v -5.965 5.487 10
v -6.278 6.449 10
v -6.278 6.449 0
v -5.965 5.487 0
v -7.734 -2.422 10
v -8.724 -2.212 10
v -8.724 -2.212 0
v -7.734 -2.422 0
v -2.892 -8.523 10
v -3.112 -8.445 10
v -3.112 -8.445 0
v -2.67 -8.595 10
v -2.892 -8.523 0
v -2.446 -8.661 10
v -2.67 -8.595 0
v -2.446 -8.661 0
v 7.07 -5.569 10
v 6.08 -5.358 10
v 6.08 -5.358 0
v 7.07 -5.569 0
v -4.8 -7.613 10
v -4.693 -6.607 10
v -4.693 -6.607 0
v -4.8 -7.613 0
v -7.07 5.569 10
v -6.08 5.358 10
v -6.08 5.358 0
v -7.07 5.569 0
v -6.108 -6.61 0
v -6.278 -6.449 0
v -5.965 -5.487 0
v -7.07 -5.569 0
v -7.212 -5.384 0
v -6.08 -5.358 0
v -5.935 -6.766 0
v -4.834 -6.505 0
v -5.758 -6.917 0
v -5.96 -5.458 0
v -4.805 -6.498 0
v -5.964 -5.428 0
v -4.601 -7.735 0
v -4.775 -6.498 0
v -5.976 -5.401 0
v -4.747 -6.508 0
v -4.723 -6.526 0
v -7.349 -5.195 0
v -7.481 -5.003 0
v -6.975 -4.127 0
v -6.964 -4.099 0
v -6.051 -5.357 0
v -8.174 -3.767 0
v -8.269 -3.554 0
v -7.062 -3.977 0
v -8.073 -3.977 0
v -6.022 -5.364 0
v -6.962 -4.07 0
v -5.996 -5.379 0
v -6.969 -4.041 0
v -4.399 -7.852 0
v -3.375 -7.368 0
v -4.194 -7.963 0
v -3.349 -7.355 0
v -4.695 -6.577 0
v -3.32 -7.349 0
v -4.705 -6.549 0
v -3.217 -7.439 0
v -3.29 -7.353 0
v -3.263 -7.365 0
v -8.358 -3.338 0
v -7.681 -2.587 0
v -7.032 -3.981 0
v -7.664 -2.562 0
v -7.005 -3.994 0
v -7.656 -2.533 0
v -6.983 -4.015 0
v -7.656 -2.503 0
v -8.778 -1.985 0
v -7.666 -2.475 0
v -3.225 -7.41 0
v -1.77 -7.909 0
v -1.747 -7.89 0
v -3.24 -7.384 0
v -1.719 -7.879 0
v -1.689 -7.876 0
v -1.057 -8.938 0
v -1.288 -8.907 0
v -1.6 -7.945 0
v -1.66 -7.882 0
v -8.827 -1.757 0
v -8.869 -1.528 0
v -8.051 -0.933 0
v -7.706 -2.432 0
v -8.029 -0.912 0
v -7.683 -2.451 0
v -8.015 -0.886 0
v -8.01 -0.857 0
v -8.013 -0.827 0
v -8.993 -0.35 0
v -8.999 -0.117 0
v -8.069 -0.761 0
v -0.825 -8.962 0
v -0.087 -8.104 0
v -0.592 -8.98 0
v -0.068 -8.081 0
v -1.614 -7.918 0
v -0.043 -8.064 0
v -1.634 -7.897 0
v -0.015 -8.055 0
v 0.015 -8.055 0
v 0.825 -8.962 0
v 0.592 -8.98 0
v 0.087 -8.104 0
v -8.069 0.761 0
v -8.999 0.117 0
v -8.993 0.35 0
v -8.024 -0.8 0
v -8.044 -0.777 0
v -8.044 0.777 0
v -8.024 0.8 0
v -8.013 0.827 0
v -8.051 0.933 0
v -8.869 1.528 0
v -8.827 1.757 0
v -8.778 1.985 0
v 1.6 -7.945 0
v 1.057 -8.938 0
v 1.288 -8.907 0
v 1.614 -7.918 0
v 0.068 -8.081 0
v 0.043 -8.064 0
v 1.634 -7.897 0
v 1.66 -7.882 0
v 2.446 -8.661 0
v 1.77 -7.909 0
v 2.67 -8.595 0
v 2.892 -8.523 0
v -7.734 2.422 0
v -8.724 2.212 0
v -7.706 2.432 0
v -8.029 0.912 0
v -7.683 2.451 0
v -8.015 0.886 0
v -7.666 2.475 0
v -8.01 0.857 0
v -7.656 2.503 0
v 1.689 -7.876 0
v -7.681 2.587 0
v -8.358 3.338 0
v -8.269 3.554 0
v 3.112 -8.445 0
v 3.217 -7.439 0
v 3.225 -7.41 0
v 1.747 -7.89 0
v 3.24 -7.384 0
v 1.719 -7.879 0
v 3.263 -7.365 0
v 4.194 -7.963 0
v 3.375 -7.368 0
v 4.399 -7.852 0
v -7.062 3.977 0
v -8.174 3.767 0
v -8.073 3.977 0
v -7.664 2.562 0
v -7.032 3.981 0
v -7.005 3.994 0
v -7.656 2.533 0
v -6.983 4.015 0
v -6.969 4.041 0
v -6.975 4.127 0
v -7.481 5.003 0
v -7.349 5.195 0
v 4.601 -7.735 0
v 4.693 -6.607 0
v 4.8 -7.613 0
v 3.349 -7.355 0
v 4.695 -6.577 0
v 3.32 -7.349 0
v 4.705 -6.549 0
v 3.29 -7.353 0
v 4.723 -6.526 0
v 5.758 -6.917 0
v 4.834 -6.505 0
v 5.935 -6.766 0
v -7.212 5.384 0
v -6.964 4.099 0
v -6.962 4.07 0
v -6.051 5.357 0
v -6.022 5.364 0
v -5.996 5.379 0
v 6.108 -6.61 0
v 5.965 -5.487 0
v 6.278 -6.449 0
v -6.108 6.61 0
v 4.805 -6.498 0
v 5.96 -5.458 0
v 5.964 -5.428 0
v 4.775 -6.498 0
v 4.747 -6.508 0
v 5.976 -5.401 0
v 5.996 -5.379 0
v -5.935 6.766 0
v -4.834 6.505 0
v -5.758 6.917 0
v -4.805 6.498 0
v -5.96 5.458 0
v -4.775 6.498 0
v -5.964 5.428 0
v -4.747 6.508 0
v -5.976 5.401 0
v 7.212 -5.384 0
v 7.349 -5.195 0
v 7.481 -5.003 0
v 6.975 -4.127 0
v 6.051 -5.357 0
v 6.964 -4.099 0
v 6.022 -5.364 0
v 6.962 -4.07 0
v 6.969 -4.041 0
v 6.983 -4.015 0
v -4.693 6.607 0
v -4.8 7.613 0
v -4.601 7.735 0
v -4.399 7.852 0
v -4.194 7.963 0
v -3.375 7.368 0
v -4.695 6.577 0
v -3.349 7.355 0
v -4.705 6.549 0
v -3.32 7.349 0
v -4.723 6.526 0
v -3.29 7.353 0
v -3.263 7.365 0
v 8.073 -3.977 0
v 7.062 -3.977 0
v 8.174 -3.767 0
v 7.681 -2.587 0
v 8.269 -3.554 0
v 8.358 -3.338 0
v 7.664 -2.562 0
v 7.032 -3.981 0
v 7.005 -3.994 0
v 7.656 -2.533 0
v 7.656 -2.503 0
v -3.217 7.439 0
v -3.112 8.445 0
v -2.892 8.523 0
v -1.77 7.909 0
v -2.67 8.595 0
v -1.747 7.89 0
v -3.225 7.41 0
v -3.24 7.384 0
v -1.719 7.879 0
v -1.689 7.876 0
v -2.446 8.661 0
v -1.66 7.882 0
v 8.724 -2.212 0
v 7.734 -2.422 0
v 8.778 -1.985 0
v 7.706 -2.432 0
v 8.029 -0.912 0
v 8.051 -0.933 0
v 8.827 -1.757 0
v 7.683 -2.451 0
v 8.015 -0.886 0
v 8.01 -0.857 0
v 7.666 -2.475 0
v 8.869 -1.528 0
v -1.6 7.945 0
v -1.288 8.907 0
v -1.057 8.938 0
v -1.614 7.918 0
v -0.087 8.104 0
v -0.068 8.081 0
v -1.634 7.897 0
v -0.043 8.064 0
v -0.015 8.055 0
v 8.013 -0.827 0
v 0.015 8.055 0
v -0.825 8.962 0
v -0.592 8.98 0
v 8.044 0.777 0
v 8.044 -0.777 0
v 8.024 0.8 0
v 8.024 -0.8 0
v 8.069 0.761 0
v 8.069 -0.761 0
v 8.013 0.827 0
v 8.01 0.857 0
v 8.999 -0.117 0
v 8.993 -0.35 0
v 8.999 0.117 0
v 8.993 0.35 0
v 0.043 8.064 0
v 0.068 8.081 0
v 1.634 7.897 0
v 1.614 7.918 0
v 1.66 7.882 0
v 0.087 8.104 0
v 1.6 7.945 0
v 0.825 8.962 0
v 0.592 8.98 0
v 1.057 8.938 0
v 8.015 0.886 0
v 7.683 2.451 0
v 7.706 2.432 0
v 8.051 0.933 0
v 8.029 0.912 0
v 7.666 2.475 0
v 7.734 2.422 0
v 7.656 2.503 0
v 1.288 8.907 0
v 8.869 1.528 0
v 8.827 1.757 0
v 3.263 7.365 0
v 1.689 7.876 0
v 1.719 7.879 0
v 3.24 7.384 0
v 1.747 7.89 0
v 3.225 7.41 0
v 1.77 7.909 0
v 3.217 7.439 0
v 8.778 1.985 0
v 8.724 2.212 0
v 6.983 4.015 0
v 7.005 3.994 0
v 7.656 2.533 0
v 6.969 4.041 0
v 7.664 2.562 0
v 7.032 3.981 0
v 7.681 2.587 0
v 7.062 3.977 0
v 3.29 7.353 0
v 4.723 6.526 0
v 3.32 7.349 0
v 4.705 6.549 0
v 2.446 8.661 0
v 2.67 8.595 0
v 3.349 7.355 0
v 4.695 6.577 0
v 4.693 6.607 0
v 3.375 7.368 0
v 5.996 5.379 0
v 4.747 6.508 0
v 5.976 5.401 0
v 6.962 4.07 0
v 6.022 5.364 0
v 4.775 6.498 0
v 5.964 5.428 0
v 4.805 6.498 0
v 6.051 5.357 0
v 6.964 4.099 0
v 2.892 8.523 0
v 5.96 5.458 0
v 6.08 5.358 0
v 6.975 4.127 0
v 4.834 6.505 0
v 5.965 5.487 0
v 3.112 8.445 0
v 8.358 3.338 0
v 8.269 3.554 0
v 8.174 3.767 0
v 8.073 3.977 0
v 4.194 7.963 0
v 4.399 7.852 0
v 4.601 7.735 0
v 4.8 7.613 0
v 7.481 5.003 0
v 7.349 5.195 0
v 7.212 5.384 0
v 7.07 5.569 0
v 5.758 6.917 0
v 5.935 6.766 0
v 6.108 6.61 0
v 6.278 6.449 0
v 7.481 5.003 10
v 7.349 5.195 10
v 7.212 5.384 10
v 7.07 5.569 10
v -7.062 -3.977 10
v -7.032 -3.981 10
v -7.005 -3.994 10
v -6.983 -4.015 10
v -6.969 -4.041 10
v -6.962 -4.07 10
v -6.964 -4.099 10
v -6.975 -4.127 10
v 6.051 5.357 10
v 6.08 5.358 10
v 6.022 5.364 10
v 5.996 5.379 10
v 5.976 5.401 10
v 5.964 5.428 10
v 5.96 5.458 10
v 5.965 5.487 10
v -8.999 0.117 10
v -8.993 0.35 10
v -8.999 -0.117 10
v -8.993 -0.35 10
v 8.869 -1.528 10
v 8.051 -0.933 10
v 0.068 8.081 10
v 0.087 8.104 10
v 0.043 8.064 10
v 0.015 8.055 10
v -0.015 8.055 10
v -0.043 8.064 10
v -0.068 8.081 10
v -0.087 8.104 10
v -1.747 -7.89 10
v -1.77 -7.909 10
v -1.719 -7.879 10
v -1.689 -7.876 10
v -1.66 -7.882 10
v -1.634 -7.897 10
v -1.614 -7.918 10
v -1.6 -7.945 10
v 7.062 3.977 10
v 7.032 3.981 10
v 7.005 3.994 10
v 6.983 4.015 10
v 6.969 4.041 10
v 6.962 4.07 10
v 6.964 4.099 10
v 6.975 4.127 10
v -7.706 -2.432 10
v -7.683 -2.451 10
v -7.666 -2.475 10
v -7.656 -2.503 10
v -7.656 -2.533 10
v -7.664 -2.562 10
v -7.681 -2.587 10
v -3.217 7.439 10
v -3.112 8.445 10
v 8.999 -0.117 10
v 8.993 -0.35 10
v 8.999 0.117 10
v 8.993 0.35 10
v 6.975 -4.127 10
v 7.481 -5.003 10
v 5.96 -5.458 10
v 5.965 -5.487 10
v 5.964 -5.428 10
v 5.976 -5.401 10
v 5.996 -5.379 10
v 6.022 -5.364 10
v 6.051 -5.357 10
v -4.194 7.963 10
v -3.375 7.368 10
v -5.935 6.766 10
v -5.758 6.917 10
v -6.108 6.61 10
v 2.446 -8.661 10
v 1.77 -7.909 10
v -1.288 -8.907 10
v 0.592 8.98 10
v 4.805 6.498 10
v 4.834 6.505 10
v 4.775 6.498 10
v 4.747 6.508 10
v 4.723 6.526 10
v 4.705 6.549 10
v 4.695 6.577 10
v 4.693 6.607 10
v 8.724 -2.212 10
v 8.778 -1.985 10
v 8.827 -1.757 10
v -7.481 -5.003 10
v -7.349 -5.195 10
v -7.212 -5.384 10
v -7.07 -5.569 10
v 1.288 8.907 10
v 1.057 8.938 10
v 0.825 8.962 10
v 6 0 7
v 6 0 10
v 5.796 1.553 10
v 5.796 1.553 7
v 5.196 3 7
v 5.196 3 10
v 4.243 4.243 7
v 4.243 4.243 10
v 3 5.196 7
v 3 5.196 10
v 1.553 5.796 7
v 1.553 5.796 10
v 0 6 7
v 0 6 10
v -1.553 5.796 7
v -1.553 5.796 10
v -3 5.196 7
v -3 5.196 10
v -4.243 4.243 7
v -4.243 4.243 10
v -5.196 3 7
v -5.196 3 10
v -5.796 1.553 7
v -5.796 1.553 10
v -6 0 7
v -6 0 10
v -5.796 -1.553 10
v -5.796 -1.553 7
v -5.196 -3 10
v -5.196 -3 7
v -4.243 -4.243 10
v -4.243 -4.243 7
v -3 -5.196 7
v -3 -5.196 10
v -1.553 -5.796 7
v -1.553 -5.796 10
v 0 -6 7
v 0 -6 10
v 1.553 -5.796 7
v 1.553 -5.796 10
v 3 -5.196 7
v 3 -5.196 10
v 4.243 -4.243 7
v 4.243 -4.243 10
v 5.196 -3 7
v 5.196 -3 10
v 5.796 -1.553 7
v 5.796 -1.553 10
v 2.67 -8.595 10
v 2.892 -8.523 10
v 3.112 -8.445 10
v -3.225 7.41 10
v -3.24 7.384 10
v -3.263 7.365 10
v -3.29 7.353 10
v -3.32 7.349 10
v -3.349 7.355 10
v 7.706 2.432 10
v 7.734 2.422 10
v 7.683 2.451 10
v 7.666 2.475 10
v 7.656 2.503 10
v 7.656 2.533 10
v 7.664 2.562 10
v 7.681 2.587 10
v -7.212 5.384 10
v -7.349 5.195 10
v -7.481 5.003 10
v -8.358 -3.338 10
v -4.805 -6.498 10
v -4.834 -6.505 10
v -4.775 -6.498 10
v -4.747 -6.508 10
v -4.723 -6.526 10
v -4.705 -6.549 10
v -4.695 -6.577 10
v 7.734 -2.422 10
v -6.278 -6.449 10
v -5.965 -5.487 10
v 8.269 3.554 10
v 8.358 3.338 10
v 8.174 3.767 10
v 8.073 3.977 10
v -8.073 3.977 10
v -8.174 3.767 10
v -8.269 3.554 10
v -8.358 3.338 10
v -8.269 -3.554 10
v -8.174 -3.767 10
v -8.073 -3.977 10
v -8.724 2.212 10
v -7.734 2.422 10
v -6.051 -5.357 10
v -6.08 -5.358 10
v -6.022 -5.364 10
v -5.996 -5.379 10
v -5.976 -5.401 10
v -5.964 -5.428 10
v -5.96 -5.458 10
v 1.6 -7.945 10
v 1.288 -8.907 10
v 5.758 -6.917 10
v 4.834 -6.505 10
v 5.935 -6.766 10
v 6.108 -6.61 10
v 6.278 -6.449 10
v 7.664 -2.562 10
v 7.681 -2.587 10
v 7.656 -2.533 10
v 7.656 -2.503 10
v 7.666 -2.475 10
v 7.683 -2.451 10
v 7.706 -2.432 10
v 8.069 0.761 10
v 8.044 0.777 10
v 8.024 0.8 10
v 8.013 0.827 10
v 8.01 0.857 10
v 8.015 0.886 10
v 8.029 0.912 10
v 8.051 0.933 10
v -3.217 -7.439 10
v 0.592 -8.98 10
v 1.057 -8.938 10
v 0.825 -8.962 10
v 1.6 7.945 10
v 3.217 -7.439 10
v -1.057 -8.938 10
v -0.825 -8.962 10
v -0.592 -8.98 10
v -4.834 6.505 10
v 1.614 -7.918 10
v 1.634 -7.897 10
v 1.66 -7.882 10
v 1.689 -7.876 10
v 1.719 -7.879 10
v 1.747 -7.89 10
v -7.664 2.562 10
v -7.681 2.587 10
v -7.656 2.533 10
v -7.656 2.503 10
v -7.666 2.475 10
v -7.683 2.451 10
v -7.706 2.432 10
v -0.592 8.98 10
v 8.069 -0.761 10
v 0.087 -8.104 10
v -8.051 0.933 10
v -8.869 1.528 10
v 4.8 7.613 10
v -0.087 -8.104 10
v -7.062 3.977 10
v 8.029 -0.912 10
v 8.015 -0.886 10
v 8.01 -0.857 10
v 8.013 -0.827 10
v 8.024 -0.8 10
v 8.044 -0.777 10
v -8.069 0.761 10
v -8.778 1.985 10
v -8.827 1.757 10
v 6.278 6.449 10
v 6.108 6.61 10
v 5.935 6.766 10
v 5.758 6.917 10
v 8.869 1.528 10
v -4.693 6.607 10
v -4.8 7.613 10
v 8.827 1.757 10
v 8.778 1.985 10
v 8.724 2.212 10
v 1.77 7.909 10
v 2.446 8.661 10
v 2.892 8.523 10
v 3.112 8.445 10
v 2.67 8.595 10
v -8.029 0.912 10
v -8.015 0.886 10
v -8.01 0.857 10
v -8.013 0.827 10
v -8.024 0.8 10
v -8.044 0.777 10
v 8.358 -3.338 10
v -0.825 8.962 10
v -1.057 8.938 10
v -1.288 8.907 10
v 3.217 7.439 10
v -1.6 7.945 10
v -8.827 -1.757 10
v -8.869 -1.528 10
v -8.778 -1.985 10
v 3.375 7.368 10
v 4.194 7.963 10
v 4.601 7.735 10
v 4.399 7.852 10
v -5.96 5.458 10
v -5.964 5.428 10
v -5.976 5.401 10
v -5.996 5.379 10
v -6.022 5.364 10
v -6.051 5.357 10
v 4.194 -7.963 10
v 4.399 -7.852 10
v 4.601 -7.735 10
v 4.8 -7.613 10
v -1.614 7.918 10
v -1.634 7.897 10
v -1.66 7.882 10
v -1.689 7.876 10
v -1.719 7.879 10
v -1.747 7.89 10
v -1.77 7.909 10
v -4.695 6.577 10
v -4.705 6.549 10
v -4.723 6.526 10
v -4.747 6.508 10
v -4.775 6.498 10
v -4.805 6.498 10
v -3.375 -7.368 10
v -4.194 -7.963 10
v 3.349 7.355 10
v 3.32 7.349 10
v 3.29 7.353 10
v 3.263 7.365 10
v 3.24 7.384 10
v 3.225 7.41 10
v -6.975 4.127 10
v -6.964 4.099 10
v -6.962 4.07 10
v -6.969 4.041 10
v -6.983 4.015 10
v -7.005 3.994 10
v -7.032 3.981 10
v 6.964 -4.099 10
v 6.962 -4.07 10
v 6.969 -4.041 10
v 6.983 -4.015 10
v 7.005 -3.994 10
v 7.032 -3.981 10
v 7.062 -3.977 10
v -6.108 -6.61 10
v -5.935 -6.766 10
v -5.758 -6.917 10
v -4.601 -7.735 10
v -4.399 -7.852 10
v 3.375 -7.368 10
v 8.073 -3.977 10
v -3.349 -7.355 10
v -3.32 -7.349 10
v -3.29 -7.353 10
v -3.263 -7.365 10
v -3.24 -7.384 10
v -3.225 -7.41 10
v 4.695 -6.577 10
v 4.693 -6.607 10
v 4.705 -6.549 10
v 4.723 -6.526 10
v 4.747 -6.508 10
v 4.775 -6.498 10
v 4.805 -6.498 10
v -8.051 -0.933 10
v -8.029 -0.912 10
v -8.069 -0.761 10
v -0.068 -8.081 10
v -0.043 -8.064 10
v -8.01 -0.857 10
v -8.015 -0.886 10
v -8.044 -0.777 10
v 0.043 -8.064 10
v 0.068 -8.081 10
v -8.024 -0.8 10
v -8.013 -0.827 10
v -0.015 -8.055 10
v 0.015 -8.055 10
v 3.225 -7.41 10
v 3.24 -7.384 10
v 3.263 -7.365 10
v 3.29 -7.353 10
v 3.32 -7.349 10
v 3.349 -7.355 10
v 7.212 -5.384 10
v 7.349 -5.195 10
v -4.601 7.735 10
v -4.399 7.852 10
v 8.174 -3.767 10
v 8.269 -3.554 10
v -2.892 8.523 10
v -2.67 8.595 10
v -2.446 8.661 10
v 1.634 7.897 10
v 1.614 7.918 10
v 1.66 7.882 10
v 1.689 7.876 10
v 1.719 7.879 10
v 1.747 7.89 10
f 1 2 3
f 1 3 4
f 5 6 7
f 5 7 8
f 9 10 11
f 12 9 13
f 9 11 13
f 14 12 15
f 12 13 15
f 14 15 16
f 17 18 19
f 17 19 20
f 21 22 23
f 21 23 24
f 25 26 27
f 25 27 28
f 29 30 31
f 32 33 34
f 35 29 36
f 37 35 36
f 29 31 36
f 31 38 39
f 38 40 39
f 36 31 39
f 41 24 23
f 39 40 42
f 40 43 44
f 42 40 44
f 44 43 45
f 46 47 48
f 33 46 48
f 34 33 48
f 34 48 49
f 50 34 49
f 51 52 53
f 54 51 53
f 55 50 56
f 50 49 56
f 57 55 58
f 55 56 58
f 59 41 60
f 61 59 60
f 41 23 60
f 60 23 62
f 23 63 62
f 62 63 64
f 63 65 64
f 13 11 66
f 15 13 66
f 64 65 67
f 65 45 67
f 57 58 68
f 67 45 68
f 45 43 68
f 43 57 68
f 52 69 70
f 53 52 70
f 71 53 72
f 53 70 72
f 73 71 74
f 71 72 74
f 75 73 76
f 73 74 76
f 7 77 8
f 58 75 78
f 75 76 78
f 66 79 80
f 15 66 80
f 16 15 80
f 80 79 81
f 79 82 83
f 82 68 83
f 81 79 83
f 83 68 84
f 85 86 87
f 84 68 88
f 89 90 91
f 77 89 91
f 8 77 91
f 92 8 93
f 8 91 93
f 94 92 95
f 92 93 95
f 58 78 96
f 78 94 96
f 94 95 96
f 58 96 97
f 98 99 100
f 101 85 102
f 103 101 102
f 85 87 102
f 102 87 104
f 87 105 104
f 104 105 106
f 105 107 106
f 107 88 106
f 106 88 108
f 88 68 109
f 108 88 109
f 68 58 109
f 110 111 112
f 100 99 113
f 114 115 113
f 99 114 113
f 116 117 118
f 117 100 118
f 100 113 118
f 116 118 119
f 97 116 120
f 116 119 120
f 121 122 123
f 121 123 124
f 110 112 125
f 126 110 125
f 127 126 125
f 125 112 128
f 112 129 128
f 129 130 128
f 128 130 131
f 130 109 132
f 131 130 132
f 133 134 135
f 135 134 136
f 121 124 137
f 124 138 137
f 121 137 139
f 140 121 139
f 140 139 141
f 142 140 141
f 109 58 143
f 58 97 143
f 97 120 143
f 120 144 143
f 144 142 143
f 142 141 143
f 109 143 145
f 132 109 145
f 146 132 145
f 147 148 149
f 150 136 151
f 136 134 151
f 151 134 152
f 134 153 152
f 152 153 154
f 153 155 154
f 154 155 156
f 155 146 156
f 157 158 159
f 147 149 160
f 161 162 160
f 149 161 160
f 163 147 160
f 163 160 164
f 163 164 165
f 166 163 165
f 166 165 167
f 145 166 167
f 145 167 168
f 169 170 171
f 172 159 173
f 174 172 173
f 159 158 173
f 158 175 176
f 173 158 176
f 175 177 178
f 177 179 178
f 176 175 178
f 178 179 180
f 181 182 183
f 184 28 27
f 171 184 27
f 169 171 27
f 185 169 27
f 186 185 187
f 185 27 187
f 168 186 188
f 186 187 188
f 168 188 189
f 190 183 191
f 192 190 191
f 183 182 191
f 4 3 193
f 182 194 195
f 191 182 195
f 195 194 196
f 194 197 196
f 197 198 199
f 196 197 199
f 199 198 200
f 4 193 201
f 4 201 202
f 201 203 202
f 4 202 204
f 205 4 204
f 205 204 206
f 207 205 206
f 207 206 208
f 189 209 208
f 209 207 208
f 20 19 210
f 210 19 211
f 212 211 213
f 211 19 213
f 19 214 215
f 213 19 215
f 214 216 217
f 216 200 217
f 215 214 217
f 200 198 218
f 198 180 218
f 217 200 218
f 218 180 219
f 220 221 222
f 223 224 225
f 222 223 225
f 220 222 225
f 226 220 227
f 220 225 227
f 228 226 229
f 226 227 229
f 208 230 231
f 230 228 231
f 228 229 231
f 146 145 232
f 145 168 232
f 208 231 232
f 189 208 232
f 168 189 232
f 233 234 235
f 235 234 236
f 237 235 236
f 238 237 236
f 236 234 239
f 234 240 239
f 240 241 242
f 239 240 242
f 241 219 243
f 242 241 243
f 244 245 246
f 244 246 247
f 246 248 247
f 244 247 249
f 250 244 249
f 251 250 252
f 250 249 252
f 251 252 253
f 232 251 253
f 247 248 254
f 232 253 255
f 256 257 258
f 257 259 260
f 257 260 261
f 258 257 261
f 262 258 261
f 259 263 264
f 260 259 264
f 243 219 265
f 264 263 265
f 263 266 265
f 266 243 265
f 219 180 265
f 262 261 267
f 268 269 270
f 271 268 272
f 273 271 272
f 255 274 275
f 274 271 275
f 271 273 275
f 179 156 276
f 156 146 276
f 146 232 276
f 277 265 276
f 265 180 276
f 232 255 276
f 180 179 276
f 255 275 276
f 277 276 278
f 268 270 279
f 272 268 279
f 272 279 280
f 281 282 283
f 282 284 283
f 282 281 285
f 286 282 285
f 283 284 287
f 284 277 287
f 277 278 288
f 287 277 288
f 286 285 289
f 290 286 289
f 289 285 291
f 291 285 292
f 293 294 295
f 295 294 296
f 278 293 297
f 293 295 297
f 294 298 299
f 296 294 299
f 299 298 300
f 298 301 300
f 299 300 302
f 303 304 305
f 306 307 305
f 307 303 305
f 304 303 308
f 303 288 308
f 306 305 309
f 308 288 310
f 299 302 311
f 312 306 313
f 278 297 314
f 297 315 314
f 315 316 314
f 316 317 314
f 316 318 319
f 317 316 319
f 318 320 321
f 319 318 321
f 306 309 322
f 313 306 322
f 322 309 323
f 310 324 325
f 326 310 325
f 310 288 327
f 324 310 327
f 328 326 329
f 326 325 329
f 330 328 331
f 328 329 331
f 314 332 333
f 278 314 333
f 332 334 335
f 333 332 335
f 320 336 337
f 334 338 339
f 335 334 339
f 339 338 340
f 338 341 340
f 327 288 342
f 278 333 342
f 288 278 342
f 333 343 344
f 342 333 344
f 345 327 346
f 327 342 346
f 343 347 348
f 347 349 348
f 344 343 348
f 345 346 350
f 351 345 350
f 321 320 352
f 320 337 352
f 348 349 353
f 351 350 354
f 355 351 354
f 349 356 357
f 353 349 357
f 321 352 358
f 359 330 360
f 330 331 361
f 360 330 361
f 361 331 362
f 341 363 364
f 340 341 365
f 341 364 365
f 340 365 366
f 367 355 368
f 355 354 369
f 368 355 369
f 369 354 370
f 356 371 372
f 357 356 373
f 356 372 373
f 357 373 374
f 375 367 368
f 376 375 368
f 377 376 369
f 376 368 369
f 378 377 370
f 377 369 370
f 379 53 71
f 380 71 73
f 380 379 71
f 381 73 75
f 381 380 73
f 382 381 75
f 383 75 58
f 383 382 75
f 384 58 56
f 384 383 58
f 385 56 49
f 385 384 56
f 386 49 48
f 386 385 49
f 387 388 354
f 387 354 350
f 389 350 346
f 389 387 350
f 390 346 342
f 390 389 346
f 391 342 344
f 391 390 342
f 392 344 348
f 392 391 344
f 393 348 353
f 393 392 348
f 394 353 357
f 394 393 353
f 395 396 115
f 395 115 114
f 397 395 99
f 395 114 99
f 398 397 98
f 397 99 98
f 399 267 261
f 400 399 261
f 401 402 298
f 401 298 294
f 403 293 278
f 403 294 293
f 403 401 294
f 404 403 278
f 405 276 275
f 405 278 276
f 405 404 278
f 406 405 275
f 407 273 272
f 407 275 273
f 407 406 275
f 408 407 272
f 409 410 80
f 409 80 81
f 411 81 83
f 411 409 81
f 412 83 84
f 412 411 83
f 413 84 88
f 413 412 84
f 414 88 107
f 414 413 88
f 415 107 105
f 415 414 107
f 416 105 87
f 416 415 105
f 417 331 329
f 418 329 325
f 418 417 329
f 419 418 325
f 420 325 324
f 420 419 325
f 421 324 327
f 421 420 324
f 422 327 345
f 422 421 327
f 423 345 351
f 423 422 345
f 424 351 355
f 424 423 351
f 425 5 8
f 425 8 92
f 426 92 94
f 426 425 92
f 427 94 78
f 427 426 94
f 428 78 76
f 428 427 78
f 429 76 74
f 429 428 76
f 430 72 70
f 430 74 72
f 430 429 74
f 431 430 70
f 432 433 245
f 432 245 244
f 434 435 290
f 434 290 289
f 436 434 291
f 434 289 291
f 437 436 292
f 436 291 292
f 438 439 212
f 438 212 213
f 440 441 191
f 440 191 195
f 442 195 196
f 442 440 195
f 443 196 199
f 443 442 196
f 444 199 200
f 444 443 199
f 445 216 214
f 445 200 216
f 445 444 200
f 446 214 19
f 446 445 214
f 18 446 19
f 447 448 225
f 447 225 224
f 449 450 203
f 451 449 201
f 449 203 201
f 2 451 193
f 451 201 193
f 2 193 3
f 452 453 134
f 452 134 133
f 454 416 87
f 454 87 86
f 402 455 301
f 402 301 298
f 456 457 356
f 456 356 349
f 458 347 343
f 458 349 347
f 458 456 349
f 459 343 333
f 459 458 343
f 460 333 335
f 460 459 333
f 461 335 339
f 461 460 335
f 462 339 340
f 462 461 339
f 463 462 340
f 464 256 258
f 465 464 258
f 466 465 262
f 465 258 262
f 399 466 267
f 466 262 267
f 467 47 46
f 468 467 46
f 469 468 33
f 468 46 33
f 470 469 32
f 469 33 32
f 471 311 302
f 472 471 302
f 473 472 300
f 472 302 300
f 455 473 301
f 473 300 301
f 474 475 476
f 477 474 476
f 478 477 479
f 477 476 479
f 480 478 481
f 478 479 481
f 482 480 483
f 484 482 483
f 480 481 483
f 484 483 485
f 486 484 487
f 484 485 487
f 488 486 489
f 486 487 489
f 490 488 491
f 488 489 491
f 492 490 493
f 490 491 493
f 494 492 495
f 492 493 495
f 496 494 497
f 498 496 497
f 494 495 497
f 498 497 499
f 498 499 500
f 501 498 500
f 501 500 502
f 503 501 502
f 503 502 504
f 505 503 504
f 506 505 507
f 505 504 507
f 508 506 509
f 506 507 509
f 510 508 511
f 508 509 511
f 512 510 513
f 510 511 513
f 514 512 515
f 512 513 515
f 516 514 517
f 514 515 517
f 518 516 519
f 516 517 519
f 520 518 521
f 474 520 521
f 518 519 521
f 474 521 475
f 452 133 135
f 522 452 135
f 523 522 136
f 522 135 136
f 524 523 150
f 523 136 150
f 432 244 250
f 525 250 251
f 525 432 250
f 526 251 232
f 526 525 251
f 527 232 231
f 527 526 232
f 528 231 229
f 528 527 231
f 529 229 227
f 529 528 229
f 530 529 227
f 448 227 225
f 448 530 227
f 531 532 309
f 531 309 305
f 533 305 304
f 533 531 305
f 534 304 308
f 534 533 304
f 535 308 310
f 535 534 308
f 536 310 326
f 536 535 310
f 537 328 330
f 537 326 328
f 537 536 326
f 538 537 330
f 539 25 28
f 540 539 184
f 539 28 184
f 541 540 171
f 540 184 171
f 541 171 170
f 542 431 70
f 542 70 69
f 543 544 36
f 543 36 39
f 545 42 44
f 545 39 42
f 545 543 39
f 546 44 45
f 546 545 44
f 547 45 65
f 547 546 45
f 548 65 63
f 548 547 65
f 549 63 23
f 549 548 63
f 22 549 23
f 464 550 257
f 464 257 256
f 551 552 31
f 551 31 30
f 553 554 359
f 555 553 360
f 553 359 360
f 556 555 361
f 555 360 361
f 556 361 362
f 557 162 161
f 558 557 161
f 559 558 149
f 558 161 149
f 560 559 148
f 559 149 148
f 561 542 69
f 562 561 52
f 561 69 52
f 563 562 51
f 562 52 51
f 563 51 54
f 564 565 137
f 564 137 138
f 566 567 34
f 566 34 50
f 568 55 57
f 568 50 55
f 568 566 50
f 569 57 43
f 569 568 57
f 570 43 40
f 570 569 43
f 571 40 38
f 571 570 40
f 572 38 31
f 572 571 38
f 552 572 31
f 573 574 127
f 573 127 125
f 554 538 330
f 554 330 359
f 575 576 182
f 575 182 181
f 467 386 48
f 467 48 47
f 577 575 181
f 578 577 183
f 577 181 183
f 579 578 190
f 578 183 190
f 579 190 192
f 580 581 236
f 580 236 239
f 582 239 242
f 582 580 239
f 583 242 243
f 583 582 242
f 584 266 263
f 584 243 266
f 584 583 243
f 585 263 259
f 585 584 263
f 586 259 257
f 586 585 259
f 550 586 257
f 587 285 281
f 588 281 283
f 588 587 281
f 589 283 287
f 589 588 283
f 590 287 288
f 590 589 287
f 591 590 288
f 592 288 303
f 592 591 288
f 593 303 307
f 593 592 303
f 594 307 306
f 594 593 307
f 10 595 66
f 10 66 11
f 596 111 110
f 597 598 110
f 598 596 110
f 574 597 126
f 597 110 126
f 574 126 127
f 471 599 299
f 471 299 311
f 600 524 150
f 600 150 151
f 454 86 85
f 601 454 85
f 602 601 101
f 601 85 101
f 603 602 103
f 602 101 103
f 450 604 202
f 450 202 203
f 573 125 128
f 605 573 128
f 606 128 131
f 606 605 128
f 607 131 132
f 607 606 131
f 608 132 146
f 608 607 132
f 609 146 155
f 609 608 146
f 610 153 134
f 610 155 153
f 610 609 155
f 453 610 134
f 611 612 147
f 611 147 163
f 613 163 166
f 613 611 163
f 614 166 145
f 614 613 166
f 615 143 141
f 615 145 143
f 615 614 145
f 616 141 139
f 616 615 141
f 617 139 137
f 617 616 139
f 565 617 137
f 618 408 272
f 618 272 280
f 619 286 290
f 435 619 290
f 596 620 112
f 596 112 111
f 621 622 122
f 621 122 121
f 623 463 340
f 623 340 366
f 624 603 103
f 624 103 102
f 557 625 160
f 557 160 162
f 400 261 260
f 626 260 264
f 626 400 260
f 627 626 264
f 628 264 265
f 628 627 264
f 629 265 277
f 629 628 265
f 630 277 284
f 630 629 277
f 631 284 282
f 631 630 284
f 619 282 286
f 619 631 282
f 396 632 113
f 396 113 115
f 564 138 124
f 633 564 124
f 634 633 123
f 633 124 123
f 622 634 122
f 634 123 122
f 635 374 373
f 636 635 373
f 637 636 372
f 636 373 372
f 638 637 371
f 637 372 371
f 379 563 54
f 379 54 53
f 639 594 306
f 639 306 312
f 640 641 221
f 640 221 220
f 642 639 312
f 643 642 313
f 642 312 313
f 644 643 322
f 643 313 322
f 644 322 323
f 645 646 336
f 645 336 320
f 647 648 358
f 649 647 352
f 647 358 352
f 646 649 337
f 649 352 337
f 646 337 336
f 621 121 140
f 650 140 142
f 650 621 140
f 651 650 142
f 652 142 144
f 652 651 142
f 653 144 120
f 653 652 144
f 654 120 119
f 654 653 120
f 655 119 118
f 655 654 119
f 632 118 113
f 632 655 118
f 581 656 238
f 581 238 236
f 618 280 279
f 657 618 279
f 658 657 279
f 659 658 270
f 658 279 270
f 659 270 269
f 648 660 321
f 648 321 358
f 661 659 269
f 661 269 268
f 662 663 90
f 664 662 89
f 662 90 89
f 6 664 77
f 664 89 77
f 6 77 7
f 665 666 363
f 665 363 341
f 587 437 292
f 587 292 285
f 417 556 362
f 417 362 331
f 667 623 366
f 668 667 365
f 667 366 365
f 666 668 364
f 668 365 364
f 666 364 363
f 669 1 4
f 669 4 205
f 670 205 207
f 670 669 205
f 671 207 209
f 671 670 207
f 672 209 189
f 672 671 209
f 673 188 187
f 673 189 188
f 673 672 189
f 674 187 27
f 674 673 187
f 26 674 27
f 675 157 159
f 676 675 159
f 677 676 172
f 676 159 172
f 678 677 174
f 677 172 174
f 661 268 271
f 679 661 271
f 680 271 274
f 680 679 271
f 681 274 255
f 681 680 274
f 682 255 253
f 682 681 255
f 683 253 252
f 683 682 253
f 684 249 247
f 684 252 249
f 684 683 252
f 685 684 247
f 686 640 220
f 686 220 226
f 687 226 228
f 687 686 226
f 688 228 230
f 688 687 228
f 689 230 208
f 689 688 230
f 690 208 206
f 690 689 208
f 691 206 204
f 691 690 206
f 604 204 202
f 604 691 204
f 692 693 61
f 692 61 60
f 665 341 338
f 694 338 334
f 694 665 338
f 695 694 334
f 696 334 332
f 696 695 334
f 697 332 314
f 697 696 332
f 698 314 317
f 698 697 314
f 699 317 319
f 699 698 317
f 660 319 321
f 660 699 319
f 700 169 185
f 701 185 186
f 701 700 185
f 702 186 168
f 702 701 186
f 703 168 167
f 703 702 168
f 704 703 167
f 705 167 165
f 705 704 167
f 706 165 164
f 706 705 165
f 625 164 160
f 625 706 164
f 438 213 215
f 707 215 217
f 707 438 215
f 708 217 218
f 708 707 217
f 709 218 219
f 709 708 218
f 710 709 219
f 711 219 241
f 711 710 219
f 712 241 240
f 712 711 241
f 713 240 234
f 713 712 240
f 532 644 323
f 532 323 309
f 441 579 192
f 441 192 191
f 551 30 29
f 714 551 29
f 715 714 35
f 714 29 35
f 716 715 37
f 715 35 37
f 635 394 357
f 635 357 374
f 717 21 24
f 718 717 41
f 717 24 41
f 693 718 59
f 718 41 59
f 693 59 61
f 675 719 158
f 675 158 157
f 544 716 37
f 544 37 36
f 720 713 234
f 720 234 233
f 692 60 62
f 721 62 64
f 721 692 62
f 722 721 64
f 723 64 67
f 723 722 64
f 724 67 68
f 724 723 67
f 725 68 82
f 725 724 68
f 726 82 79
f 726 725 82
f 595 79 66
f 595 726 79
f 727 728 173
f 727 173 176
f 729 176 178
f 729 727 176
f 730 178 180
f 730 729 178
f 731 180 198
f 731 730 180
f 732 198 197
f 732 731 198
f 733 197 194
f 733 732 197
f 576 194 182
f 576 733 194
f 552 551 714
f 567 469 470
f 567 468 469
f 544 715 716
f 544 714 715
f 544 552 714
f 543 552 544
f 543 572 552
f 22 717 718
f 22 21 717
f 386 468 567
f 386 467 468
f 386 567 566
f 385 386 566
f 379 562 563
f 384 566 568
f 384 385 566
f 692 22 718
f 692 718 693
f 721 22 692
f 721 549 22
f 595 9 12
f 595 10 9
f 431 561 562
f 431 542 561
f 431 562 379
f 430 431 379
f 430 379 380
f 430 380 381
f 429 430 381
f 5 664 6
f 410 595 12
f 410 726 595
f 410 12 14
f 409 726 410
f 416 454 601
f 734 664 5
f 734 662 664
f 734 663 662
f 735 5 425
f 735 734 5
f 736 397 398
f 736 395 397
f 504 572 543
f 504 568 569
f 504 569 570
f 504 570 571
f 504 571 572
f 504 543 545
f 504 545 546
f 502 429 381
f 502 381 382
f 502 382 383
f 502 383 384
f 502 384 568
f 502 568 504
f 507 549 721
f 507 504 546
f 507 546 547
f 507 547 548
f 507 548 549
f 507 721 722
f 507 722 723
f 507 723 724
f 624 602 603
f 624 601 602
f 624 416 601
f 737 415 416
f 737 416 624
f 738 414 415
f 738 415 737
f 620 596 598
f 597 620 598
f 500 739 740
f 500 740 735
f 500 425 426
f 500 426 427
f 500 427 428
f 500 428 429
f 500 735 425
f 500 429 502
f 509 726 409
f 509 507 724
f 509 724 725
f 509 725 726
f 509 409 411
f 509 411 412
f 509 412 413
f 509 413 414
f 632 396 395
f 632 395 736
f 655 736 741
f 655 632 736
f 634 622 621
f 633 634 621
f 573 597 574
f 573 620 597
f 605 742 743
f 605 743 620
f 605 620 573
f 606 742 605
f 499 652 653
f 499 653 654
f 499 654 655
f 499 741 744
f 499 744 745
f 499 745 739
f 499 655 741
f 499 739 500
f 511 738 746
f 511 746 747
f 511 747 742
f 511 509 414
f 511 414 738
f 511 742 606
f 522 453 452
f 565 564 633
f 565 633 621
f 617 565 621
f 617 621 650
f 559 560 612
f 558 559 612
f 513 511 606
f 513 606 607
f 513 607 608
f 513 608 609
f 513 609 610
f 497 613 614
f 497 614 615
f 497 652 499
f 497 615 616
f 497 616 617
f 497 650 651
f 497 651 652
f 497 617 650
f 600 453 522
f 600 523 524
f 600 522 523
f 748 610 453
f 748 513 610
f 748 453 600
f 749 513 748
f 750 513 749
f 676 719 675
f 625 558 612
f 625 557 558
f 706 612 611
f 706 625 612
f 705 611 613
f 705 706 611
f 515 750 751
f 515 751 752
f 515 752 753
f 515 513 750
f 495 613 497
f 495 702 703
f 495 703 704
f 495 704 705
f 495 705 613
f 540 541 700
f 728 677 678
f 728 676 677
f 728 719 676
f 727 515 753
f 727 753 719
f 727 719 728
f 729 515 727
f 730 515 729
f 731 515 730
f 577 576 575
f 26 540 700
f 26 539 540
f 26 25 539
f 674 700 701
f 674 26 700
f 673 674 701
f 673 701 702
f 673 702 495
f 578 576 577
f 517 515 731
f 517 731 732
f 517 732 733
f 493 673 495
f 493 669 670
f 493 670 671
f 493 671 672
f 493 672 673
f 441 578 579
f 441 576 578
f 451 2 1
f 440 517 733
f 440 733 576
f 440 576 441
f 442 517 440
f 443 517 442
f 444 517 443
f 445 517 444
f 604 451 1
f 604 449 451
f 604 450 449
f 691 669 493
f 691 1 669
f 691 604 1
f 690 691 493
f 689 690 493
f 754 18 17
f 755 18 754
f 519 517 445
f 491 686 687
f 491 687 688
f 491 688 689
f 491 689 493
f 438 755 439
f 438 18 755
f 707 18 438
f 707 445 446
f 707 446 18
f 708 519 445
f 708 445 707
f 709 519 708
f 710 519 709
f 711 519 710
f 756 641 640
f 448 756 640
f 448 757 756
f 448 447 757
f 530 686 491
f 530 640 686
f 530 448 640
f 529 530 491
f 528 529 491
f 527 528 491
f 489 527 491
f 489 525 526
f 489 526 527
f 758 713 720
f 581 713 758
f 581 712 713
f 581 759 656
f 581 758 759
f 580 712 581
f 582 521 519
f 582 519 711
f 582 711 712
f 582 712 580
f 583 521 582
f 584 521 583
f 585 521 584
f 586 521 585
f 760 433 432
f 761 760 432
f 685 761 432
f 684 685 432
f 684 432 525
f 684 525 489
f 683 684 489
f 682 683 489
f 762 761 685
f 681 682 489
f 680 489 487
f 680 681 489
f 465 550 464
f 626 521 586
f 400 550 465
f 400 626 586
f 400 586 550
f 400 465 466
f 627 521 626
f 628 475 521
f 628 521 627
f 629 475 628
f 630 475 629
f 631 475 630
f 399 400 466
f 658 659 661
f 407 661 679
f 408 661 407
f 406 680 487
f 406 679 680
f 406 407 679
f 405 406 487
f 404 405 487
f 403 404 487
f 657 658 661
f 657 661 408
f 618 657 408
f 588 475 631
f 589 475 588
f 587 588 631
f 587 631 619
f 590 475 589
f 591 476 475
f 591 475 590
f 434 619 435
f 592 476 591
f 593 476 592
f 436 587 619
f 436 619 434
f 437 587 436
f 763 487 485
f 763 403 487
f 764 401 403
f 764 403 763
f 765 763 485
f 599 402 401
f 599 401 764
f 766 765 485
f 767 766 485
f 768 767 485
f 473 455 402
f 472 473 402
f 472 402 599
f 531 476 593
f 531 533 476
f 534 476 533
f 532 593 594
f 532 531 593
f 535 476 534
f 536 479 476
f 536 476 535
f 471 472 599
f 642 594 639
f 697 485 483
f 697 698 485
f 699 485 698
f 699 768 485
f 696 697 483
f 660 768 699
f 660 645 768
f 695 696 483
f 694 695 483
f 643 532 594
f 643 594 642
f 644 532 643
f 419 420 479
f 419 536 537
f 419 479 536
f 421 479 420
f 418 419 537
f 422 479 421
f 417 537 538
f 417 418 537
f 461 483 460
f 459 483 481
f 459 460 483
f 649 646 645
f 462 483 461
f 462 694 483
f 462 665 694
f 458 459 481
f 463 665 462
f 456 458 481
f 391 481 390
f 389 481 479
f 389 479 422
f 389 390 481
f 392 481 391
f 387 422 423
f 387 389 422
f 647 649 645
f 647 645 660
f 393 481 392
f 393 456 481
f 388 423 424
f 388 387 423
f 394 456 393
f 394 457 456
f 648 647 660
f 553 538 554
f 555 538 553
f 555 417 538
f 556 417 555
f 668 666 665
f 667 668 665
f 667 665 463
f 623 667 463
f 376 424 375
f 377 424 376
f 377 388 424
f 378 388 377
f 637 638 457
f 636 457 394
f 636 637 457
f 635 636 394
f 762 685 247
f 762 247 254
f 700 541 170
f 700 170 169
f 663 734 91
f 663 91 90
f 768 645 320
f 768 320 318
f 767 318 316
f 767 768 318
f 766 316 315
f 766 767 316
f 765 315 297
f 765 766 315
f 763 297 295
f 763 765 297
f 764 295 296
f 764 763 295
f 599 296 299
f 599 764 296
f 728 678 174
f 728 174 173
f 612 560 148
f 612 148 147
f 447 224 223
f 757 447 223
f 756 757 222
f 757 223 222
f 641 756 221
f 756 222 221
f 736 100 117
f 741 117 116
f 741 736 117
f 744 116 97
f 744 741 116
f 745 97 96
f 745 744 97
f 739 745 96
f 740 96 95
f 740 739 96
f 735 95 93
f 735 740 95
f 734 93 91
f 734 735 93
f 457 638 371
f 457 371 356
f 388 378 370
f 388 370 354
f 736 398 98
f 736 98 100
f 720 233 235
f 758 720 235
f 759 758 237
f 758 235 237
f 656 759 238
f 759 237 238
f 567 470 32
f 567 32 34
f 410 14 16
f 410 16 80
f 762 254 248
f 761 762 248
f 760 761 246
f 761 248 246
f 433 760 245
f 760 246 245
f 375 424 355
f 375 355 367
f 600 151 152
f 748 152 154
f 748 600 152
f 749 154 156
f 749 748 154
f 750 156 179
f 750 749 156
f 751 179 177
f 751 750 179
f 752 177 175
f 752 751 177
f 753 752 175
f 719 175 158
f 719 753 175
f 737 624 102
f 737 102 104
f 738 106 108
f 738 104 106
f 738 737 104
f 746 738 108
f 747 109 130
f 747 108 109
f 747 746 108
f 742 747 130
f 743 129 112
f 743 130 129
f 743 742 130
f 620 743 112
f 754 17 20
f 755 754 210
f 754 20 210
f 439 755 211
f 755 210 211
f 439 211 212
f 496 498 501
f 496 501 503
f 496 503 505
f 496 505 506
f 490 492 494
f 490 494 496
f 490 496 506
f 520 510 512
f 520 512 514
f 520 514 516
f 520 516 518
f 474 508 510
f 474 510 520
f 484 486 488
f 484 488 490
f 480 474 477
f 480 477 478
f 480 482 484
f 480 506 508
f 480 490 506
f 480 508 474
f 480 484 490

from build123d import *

# Parameters (mm, degrees)
SKETCH1_R           = 9
BOSS_EXTRUDE1_DEPTH = 10
SKETCH2_R           = 6
CUT_EXTRUDE1_DEPTH  = 3
CUT_EXTRUDE2_DEPTH  = 17.186414056
CIRPATTERN1_COUNT   = 30


with BuildPart() as part:
    # Sketch1 → Boss-Extrude1 (new body)
    with BuildSketch(Plane.XY):
        Circle(SKETCH1_R)
    extrude(amount=BOSS_EXTRUDE1_DEPTH)

    # Sketch2 → Cut-Extrude1 (cut)
    with BuildSketch(Plane.XY.offset(10)):
        Circle(SKETCH2_R)
    extrude(amount=-CUT_EXTRUDE1_DEPTH, mode=Mode.SUBTRACT)

    # Sketch3 → Cut-Extrude2 (cut, through all)
    with BuildSketch(Plane.XY.offset(10)):
        with BuildLine():
            Line((-1.633345226, 10.785436843), (1.633345226, 10.785436843))
            Line((1.633345226, 10.785436843), (0.6, 8.994081534))
            Line((0.6, 8.994081534), (0.086621258, 8.104113968))
            ThreePointArc((0.086621258, 8.104113968), (0, 8.054081534), (-0.086621258, 8.104113968))
            Line((-0.086621258, 8.104113968), (-0.6, 8.994081534))
            Line((-0.6, 8.994081534), (-1.633345226, 10.785436843))
        make_face()
    cut_extrude2 = extrude(amount=-CUT_EXTRUDE2_DEPTH, mode=Mode.SUBTRACT)

    # CirPattern1: Cut-Extrude2 ×30 about axis
    cirpattern1_axis = Axis((0, 0, 0), (0, 0, 1))
    for i in range(1, CIRPATTERN1_COUNT):
        add(cut_extrude2.rotate(cirpattern1_axis, i * 360 / CIRPATTERN1_COUNT), mode=Mode.SUBTRACT)


solid = part.part
